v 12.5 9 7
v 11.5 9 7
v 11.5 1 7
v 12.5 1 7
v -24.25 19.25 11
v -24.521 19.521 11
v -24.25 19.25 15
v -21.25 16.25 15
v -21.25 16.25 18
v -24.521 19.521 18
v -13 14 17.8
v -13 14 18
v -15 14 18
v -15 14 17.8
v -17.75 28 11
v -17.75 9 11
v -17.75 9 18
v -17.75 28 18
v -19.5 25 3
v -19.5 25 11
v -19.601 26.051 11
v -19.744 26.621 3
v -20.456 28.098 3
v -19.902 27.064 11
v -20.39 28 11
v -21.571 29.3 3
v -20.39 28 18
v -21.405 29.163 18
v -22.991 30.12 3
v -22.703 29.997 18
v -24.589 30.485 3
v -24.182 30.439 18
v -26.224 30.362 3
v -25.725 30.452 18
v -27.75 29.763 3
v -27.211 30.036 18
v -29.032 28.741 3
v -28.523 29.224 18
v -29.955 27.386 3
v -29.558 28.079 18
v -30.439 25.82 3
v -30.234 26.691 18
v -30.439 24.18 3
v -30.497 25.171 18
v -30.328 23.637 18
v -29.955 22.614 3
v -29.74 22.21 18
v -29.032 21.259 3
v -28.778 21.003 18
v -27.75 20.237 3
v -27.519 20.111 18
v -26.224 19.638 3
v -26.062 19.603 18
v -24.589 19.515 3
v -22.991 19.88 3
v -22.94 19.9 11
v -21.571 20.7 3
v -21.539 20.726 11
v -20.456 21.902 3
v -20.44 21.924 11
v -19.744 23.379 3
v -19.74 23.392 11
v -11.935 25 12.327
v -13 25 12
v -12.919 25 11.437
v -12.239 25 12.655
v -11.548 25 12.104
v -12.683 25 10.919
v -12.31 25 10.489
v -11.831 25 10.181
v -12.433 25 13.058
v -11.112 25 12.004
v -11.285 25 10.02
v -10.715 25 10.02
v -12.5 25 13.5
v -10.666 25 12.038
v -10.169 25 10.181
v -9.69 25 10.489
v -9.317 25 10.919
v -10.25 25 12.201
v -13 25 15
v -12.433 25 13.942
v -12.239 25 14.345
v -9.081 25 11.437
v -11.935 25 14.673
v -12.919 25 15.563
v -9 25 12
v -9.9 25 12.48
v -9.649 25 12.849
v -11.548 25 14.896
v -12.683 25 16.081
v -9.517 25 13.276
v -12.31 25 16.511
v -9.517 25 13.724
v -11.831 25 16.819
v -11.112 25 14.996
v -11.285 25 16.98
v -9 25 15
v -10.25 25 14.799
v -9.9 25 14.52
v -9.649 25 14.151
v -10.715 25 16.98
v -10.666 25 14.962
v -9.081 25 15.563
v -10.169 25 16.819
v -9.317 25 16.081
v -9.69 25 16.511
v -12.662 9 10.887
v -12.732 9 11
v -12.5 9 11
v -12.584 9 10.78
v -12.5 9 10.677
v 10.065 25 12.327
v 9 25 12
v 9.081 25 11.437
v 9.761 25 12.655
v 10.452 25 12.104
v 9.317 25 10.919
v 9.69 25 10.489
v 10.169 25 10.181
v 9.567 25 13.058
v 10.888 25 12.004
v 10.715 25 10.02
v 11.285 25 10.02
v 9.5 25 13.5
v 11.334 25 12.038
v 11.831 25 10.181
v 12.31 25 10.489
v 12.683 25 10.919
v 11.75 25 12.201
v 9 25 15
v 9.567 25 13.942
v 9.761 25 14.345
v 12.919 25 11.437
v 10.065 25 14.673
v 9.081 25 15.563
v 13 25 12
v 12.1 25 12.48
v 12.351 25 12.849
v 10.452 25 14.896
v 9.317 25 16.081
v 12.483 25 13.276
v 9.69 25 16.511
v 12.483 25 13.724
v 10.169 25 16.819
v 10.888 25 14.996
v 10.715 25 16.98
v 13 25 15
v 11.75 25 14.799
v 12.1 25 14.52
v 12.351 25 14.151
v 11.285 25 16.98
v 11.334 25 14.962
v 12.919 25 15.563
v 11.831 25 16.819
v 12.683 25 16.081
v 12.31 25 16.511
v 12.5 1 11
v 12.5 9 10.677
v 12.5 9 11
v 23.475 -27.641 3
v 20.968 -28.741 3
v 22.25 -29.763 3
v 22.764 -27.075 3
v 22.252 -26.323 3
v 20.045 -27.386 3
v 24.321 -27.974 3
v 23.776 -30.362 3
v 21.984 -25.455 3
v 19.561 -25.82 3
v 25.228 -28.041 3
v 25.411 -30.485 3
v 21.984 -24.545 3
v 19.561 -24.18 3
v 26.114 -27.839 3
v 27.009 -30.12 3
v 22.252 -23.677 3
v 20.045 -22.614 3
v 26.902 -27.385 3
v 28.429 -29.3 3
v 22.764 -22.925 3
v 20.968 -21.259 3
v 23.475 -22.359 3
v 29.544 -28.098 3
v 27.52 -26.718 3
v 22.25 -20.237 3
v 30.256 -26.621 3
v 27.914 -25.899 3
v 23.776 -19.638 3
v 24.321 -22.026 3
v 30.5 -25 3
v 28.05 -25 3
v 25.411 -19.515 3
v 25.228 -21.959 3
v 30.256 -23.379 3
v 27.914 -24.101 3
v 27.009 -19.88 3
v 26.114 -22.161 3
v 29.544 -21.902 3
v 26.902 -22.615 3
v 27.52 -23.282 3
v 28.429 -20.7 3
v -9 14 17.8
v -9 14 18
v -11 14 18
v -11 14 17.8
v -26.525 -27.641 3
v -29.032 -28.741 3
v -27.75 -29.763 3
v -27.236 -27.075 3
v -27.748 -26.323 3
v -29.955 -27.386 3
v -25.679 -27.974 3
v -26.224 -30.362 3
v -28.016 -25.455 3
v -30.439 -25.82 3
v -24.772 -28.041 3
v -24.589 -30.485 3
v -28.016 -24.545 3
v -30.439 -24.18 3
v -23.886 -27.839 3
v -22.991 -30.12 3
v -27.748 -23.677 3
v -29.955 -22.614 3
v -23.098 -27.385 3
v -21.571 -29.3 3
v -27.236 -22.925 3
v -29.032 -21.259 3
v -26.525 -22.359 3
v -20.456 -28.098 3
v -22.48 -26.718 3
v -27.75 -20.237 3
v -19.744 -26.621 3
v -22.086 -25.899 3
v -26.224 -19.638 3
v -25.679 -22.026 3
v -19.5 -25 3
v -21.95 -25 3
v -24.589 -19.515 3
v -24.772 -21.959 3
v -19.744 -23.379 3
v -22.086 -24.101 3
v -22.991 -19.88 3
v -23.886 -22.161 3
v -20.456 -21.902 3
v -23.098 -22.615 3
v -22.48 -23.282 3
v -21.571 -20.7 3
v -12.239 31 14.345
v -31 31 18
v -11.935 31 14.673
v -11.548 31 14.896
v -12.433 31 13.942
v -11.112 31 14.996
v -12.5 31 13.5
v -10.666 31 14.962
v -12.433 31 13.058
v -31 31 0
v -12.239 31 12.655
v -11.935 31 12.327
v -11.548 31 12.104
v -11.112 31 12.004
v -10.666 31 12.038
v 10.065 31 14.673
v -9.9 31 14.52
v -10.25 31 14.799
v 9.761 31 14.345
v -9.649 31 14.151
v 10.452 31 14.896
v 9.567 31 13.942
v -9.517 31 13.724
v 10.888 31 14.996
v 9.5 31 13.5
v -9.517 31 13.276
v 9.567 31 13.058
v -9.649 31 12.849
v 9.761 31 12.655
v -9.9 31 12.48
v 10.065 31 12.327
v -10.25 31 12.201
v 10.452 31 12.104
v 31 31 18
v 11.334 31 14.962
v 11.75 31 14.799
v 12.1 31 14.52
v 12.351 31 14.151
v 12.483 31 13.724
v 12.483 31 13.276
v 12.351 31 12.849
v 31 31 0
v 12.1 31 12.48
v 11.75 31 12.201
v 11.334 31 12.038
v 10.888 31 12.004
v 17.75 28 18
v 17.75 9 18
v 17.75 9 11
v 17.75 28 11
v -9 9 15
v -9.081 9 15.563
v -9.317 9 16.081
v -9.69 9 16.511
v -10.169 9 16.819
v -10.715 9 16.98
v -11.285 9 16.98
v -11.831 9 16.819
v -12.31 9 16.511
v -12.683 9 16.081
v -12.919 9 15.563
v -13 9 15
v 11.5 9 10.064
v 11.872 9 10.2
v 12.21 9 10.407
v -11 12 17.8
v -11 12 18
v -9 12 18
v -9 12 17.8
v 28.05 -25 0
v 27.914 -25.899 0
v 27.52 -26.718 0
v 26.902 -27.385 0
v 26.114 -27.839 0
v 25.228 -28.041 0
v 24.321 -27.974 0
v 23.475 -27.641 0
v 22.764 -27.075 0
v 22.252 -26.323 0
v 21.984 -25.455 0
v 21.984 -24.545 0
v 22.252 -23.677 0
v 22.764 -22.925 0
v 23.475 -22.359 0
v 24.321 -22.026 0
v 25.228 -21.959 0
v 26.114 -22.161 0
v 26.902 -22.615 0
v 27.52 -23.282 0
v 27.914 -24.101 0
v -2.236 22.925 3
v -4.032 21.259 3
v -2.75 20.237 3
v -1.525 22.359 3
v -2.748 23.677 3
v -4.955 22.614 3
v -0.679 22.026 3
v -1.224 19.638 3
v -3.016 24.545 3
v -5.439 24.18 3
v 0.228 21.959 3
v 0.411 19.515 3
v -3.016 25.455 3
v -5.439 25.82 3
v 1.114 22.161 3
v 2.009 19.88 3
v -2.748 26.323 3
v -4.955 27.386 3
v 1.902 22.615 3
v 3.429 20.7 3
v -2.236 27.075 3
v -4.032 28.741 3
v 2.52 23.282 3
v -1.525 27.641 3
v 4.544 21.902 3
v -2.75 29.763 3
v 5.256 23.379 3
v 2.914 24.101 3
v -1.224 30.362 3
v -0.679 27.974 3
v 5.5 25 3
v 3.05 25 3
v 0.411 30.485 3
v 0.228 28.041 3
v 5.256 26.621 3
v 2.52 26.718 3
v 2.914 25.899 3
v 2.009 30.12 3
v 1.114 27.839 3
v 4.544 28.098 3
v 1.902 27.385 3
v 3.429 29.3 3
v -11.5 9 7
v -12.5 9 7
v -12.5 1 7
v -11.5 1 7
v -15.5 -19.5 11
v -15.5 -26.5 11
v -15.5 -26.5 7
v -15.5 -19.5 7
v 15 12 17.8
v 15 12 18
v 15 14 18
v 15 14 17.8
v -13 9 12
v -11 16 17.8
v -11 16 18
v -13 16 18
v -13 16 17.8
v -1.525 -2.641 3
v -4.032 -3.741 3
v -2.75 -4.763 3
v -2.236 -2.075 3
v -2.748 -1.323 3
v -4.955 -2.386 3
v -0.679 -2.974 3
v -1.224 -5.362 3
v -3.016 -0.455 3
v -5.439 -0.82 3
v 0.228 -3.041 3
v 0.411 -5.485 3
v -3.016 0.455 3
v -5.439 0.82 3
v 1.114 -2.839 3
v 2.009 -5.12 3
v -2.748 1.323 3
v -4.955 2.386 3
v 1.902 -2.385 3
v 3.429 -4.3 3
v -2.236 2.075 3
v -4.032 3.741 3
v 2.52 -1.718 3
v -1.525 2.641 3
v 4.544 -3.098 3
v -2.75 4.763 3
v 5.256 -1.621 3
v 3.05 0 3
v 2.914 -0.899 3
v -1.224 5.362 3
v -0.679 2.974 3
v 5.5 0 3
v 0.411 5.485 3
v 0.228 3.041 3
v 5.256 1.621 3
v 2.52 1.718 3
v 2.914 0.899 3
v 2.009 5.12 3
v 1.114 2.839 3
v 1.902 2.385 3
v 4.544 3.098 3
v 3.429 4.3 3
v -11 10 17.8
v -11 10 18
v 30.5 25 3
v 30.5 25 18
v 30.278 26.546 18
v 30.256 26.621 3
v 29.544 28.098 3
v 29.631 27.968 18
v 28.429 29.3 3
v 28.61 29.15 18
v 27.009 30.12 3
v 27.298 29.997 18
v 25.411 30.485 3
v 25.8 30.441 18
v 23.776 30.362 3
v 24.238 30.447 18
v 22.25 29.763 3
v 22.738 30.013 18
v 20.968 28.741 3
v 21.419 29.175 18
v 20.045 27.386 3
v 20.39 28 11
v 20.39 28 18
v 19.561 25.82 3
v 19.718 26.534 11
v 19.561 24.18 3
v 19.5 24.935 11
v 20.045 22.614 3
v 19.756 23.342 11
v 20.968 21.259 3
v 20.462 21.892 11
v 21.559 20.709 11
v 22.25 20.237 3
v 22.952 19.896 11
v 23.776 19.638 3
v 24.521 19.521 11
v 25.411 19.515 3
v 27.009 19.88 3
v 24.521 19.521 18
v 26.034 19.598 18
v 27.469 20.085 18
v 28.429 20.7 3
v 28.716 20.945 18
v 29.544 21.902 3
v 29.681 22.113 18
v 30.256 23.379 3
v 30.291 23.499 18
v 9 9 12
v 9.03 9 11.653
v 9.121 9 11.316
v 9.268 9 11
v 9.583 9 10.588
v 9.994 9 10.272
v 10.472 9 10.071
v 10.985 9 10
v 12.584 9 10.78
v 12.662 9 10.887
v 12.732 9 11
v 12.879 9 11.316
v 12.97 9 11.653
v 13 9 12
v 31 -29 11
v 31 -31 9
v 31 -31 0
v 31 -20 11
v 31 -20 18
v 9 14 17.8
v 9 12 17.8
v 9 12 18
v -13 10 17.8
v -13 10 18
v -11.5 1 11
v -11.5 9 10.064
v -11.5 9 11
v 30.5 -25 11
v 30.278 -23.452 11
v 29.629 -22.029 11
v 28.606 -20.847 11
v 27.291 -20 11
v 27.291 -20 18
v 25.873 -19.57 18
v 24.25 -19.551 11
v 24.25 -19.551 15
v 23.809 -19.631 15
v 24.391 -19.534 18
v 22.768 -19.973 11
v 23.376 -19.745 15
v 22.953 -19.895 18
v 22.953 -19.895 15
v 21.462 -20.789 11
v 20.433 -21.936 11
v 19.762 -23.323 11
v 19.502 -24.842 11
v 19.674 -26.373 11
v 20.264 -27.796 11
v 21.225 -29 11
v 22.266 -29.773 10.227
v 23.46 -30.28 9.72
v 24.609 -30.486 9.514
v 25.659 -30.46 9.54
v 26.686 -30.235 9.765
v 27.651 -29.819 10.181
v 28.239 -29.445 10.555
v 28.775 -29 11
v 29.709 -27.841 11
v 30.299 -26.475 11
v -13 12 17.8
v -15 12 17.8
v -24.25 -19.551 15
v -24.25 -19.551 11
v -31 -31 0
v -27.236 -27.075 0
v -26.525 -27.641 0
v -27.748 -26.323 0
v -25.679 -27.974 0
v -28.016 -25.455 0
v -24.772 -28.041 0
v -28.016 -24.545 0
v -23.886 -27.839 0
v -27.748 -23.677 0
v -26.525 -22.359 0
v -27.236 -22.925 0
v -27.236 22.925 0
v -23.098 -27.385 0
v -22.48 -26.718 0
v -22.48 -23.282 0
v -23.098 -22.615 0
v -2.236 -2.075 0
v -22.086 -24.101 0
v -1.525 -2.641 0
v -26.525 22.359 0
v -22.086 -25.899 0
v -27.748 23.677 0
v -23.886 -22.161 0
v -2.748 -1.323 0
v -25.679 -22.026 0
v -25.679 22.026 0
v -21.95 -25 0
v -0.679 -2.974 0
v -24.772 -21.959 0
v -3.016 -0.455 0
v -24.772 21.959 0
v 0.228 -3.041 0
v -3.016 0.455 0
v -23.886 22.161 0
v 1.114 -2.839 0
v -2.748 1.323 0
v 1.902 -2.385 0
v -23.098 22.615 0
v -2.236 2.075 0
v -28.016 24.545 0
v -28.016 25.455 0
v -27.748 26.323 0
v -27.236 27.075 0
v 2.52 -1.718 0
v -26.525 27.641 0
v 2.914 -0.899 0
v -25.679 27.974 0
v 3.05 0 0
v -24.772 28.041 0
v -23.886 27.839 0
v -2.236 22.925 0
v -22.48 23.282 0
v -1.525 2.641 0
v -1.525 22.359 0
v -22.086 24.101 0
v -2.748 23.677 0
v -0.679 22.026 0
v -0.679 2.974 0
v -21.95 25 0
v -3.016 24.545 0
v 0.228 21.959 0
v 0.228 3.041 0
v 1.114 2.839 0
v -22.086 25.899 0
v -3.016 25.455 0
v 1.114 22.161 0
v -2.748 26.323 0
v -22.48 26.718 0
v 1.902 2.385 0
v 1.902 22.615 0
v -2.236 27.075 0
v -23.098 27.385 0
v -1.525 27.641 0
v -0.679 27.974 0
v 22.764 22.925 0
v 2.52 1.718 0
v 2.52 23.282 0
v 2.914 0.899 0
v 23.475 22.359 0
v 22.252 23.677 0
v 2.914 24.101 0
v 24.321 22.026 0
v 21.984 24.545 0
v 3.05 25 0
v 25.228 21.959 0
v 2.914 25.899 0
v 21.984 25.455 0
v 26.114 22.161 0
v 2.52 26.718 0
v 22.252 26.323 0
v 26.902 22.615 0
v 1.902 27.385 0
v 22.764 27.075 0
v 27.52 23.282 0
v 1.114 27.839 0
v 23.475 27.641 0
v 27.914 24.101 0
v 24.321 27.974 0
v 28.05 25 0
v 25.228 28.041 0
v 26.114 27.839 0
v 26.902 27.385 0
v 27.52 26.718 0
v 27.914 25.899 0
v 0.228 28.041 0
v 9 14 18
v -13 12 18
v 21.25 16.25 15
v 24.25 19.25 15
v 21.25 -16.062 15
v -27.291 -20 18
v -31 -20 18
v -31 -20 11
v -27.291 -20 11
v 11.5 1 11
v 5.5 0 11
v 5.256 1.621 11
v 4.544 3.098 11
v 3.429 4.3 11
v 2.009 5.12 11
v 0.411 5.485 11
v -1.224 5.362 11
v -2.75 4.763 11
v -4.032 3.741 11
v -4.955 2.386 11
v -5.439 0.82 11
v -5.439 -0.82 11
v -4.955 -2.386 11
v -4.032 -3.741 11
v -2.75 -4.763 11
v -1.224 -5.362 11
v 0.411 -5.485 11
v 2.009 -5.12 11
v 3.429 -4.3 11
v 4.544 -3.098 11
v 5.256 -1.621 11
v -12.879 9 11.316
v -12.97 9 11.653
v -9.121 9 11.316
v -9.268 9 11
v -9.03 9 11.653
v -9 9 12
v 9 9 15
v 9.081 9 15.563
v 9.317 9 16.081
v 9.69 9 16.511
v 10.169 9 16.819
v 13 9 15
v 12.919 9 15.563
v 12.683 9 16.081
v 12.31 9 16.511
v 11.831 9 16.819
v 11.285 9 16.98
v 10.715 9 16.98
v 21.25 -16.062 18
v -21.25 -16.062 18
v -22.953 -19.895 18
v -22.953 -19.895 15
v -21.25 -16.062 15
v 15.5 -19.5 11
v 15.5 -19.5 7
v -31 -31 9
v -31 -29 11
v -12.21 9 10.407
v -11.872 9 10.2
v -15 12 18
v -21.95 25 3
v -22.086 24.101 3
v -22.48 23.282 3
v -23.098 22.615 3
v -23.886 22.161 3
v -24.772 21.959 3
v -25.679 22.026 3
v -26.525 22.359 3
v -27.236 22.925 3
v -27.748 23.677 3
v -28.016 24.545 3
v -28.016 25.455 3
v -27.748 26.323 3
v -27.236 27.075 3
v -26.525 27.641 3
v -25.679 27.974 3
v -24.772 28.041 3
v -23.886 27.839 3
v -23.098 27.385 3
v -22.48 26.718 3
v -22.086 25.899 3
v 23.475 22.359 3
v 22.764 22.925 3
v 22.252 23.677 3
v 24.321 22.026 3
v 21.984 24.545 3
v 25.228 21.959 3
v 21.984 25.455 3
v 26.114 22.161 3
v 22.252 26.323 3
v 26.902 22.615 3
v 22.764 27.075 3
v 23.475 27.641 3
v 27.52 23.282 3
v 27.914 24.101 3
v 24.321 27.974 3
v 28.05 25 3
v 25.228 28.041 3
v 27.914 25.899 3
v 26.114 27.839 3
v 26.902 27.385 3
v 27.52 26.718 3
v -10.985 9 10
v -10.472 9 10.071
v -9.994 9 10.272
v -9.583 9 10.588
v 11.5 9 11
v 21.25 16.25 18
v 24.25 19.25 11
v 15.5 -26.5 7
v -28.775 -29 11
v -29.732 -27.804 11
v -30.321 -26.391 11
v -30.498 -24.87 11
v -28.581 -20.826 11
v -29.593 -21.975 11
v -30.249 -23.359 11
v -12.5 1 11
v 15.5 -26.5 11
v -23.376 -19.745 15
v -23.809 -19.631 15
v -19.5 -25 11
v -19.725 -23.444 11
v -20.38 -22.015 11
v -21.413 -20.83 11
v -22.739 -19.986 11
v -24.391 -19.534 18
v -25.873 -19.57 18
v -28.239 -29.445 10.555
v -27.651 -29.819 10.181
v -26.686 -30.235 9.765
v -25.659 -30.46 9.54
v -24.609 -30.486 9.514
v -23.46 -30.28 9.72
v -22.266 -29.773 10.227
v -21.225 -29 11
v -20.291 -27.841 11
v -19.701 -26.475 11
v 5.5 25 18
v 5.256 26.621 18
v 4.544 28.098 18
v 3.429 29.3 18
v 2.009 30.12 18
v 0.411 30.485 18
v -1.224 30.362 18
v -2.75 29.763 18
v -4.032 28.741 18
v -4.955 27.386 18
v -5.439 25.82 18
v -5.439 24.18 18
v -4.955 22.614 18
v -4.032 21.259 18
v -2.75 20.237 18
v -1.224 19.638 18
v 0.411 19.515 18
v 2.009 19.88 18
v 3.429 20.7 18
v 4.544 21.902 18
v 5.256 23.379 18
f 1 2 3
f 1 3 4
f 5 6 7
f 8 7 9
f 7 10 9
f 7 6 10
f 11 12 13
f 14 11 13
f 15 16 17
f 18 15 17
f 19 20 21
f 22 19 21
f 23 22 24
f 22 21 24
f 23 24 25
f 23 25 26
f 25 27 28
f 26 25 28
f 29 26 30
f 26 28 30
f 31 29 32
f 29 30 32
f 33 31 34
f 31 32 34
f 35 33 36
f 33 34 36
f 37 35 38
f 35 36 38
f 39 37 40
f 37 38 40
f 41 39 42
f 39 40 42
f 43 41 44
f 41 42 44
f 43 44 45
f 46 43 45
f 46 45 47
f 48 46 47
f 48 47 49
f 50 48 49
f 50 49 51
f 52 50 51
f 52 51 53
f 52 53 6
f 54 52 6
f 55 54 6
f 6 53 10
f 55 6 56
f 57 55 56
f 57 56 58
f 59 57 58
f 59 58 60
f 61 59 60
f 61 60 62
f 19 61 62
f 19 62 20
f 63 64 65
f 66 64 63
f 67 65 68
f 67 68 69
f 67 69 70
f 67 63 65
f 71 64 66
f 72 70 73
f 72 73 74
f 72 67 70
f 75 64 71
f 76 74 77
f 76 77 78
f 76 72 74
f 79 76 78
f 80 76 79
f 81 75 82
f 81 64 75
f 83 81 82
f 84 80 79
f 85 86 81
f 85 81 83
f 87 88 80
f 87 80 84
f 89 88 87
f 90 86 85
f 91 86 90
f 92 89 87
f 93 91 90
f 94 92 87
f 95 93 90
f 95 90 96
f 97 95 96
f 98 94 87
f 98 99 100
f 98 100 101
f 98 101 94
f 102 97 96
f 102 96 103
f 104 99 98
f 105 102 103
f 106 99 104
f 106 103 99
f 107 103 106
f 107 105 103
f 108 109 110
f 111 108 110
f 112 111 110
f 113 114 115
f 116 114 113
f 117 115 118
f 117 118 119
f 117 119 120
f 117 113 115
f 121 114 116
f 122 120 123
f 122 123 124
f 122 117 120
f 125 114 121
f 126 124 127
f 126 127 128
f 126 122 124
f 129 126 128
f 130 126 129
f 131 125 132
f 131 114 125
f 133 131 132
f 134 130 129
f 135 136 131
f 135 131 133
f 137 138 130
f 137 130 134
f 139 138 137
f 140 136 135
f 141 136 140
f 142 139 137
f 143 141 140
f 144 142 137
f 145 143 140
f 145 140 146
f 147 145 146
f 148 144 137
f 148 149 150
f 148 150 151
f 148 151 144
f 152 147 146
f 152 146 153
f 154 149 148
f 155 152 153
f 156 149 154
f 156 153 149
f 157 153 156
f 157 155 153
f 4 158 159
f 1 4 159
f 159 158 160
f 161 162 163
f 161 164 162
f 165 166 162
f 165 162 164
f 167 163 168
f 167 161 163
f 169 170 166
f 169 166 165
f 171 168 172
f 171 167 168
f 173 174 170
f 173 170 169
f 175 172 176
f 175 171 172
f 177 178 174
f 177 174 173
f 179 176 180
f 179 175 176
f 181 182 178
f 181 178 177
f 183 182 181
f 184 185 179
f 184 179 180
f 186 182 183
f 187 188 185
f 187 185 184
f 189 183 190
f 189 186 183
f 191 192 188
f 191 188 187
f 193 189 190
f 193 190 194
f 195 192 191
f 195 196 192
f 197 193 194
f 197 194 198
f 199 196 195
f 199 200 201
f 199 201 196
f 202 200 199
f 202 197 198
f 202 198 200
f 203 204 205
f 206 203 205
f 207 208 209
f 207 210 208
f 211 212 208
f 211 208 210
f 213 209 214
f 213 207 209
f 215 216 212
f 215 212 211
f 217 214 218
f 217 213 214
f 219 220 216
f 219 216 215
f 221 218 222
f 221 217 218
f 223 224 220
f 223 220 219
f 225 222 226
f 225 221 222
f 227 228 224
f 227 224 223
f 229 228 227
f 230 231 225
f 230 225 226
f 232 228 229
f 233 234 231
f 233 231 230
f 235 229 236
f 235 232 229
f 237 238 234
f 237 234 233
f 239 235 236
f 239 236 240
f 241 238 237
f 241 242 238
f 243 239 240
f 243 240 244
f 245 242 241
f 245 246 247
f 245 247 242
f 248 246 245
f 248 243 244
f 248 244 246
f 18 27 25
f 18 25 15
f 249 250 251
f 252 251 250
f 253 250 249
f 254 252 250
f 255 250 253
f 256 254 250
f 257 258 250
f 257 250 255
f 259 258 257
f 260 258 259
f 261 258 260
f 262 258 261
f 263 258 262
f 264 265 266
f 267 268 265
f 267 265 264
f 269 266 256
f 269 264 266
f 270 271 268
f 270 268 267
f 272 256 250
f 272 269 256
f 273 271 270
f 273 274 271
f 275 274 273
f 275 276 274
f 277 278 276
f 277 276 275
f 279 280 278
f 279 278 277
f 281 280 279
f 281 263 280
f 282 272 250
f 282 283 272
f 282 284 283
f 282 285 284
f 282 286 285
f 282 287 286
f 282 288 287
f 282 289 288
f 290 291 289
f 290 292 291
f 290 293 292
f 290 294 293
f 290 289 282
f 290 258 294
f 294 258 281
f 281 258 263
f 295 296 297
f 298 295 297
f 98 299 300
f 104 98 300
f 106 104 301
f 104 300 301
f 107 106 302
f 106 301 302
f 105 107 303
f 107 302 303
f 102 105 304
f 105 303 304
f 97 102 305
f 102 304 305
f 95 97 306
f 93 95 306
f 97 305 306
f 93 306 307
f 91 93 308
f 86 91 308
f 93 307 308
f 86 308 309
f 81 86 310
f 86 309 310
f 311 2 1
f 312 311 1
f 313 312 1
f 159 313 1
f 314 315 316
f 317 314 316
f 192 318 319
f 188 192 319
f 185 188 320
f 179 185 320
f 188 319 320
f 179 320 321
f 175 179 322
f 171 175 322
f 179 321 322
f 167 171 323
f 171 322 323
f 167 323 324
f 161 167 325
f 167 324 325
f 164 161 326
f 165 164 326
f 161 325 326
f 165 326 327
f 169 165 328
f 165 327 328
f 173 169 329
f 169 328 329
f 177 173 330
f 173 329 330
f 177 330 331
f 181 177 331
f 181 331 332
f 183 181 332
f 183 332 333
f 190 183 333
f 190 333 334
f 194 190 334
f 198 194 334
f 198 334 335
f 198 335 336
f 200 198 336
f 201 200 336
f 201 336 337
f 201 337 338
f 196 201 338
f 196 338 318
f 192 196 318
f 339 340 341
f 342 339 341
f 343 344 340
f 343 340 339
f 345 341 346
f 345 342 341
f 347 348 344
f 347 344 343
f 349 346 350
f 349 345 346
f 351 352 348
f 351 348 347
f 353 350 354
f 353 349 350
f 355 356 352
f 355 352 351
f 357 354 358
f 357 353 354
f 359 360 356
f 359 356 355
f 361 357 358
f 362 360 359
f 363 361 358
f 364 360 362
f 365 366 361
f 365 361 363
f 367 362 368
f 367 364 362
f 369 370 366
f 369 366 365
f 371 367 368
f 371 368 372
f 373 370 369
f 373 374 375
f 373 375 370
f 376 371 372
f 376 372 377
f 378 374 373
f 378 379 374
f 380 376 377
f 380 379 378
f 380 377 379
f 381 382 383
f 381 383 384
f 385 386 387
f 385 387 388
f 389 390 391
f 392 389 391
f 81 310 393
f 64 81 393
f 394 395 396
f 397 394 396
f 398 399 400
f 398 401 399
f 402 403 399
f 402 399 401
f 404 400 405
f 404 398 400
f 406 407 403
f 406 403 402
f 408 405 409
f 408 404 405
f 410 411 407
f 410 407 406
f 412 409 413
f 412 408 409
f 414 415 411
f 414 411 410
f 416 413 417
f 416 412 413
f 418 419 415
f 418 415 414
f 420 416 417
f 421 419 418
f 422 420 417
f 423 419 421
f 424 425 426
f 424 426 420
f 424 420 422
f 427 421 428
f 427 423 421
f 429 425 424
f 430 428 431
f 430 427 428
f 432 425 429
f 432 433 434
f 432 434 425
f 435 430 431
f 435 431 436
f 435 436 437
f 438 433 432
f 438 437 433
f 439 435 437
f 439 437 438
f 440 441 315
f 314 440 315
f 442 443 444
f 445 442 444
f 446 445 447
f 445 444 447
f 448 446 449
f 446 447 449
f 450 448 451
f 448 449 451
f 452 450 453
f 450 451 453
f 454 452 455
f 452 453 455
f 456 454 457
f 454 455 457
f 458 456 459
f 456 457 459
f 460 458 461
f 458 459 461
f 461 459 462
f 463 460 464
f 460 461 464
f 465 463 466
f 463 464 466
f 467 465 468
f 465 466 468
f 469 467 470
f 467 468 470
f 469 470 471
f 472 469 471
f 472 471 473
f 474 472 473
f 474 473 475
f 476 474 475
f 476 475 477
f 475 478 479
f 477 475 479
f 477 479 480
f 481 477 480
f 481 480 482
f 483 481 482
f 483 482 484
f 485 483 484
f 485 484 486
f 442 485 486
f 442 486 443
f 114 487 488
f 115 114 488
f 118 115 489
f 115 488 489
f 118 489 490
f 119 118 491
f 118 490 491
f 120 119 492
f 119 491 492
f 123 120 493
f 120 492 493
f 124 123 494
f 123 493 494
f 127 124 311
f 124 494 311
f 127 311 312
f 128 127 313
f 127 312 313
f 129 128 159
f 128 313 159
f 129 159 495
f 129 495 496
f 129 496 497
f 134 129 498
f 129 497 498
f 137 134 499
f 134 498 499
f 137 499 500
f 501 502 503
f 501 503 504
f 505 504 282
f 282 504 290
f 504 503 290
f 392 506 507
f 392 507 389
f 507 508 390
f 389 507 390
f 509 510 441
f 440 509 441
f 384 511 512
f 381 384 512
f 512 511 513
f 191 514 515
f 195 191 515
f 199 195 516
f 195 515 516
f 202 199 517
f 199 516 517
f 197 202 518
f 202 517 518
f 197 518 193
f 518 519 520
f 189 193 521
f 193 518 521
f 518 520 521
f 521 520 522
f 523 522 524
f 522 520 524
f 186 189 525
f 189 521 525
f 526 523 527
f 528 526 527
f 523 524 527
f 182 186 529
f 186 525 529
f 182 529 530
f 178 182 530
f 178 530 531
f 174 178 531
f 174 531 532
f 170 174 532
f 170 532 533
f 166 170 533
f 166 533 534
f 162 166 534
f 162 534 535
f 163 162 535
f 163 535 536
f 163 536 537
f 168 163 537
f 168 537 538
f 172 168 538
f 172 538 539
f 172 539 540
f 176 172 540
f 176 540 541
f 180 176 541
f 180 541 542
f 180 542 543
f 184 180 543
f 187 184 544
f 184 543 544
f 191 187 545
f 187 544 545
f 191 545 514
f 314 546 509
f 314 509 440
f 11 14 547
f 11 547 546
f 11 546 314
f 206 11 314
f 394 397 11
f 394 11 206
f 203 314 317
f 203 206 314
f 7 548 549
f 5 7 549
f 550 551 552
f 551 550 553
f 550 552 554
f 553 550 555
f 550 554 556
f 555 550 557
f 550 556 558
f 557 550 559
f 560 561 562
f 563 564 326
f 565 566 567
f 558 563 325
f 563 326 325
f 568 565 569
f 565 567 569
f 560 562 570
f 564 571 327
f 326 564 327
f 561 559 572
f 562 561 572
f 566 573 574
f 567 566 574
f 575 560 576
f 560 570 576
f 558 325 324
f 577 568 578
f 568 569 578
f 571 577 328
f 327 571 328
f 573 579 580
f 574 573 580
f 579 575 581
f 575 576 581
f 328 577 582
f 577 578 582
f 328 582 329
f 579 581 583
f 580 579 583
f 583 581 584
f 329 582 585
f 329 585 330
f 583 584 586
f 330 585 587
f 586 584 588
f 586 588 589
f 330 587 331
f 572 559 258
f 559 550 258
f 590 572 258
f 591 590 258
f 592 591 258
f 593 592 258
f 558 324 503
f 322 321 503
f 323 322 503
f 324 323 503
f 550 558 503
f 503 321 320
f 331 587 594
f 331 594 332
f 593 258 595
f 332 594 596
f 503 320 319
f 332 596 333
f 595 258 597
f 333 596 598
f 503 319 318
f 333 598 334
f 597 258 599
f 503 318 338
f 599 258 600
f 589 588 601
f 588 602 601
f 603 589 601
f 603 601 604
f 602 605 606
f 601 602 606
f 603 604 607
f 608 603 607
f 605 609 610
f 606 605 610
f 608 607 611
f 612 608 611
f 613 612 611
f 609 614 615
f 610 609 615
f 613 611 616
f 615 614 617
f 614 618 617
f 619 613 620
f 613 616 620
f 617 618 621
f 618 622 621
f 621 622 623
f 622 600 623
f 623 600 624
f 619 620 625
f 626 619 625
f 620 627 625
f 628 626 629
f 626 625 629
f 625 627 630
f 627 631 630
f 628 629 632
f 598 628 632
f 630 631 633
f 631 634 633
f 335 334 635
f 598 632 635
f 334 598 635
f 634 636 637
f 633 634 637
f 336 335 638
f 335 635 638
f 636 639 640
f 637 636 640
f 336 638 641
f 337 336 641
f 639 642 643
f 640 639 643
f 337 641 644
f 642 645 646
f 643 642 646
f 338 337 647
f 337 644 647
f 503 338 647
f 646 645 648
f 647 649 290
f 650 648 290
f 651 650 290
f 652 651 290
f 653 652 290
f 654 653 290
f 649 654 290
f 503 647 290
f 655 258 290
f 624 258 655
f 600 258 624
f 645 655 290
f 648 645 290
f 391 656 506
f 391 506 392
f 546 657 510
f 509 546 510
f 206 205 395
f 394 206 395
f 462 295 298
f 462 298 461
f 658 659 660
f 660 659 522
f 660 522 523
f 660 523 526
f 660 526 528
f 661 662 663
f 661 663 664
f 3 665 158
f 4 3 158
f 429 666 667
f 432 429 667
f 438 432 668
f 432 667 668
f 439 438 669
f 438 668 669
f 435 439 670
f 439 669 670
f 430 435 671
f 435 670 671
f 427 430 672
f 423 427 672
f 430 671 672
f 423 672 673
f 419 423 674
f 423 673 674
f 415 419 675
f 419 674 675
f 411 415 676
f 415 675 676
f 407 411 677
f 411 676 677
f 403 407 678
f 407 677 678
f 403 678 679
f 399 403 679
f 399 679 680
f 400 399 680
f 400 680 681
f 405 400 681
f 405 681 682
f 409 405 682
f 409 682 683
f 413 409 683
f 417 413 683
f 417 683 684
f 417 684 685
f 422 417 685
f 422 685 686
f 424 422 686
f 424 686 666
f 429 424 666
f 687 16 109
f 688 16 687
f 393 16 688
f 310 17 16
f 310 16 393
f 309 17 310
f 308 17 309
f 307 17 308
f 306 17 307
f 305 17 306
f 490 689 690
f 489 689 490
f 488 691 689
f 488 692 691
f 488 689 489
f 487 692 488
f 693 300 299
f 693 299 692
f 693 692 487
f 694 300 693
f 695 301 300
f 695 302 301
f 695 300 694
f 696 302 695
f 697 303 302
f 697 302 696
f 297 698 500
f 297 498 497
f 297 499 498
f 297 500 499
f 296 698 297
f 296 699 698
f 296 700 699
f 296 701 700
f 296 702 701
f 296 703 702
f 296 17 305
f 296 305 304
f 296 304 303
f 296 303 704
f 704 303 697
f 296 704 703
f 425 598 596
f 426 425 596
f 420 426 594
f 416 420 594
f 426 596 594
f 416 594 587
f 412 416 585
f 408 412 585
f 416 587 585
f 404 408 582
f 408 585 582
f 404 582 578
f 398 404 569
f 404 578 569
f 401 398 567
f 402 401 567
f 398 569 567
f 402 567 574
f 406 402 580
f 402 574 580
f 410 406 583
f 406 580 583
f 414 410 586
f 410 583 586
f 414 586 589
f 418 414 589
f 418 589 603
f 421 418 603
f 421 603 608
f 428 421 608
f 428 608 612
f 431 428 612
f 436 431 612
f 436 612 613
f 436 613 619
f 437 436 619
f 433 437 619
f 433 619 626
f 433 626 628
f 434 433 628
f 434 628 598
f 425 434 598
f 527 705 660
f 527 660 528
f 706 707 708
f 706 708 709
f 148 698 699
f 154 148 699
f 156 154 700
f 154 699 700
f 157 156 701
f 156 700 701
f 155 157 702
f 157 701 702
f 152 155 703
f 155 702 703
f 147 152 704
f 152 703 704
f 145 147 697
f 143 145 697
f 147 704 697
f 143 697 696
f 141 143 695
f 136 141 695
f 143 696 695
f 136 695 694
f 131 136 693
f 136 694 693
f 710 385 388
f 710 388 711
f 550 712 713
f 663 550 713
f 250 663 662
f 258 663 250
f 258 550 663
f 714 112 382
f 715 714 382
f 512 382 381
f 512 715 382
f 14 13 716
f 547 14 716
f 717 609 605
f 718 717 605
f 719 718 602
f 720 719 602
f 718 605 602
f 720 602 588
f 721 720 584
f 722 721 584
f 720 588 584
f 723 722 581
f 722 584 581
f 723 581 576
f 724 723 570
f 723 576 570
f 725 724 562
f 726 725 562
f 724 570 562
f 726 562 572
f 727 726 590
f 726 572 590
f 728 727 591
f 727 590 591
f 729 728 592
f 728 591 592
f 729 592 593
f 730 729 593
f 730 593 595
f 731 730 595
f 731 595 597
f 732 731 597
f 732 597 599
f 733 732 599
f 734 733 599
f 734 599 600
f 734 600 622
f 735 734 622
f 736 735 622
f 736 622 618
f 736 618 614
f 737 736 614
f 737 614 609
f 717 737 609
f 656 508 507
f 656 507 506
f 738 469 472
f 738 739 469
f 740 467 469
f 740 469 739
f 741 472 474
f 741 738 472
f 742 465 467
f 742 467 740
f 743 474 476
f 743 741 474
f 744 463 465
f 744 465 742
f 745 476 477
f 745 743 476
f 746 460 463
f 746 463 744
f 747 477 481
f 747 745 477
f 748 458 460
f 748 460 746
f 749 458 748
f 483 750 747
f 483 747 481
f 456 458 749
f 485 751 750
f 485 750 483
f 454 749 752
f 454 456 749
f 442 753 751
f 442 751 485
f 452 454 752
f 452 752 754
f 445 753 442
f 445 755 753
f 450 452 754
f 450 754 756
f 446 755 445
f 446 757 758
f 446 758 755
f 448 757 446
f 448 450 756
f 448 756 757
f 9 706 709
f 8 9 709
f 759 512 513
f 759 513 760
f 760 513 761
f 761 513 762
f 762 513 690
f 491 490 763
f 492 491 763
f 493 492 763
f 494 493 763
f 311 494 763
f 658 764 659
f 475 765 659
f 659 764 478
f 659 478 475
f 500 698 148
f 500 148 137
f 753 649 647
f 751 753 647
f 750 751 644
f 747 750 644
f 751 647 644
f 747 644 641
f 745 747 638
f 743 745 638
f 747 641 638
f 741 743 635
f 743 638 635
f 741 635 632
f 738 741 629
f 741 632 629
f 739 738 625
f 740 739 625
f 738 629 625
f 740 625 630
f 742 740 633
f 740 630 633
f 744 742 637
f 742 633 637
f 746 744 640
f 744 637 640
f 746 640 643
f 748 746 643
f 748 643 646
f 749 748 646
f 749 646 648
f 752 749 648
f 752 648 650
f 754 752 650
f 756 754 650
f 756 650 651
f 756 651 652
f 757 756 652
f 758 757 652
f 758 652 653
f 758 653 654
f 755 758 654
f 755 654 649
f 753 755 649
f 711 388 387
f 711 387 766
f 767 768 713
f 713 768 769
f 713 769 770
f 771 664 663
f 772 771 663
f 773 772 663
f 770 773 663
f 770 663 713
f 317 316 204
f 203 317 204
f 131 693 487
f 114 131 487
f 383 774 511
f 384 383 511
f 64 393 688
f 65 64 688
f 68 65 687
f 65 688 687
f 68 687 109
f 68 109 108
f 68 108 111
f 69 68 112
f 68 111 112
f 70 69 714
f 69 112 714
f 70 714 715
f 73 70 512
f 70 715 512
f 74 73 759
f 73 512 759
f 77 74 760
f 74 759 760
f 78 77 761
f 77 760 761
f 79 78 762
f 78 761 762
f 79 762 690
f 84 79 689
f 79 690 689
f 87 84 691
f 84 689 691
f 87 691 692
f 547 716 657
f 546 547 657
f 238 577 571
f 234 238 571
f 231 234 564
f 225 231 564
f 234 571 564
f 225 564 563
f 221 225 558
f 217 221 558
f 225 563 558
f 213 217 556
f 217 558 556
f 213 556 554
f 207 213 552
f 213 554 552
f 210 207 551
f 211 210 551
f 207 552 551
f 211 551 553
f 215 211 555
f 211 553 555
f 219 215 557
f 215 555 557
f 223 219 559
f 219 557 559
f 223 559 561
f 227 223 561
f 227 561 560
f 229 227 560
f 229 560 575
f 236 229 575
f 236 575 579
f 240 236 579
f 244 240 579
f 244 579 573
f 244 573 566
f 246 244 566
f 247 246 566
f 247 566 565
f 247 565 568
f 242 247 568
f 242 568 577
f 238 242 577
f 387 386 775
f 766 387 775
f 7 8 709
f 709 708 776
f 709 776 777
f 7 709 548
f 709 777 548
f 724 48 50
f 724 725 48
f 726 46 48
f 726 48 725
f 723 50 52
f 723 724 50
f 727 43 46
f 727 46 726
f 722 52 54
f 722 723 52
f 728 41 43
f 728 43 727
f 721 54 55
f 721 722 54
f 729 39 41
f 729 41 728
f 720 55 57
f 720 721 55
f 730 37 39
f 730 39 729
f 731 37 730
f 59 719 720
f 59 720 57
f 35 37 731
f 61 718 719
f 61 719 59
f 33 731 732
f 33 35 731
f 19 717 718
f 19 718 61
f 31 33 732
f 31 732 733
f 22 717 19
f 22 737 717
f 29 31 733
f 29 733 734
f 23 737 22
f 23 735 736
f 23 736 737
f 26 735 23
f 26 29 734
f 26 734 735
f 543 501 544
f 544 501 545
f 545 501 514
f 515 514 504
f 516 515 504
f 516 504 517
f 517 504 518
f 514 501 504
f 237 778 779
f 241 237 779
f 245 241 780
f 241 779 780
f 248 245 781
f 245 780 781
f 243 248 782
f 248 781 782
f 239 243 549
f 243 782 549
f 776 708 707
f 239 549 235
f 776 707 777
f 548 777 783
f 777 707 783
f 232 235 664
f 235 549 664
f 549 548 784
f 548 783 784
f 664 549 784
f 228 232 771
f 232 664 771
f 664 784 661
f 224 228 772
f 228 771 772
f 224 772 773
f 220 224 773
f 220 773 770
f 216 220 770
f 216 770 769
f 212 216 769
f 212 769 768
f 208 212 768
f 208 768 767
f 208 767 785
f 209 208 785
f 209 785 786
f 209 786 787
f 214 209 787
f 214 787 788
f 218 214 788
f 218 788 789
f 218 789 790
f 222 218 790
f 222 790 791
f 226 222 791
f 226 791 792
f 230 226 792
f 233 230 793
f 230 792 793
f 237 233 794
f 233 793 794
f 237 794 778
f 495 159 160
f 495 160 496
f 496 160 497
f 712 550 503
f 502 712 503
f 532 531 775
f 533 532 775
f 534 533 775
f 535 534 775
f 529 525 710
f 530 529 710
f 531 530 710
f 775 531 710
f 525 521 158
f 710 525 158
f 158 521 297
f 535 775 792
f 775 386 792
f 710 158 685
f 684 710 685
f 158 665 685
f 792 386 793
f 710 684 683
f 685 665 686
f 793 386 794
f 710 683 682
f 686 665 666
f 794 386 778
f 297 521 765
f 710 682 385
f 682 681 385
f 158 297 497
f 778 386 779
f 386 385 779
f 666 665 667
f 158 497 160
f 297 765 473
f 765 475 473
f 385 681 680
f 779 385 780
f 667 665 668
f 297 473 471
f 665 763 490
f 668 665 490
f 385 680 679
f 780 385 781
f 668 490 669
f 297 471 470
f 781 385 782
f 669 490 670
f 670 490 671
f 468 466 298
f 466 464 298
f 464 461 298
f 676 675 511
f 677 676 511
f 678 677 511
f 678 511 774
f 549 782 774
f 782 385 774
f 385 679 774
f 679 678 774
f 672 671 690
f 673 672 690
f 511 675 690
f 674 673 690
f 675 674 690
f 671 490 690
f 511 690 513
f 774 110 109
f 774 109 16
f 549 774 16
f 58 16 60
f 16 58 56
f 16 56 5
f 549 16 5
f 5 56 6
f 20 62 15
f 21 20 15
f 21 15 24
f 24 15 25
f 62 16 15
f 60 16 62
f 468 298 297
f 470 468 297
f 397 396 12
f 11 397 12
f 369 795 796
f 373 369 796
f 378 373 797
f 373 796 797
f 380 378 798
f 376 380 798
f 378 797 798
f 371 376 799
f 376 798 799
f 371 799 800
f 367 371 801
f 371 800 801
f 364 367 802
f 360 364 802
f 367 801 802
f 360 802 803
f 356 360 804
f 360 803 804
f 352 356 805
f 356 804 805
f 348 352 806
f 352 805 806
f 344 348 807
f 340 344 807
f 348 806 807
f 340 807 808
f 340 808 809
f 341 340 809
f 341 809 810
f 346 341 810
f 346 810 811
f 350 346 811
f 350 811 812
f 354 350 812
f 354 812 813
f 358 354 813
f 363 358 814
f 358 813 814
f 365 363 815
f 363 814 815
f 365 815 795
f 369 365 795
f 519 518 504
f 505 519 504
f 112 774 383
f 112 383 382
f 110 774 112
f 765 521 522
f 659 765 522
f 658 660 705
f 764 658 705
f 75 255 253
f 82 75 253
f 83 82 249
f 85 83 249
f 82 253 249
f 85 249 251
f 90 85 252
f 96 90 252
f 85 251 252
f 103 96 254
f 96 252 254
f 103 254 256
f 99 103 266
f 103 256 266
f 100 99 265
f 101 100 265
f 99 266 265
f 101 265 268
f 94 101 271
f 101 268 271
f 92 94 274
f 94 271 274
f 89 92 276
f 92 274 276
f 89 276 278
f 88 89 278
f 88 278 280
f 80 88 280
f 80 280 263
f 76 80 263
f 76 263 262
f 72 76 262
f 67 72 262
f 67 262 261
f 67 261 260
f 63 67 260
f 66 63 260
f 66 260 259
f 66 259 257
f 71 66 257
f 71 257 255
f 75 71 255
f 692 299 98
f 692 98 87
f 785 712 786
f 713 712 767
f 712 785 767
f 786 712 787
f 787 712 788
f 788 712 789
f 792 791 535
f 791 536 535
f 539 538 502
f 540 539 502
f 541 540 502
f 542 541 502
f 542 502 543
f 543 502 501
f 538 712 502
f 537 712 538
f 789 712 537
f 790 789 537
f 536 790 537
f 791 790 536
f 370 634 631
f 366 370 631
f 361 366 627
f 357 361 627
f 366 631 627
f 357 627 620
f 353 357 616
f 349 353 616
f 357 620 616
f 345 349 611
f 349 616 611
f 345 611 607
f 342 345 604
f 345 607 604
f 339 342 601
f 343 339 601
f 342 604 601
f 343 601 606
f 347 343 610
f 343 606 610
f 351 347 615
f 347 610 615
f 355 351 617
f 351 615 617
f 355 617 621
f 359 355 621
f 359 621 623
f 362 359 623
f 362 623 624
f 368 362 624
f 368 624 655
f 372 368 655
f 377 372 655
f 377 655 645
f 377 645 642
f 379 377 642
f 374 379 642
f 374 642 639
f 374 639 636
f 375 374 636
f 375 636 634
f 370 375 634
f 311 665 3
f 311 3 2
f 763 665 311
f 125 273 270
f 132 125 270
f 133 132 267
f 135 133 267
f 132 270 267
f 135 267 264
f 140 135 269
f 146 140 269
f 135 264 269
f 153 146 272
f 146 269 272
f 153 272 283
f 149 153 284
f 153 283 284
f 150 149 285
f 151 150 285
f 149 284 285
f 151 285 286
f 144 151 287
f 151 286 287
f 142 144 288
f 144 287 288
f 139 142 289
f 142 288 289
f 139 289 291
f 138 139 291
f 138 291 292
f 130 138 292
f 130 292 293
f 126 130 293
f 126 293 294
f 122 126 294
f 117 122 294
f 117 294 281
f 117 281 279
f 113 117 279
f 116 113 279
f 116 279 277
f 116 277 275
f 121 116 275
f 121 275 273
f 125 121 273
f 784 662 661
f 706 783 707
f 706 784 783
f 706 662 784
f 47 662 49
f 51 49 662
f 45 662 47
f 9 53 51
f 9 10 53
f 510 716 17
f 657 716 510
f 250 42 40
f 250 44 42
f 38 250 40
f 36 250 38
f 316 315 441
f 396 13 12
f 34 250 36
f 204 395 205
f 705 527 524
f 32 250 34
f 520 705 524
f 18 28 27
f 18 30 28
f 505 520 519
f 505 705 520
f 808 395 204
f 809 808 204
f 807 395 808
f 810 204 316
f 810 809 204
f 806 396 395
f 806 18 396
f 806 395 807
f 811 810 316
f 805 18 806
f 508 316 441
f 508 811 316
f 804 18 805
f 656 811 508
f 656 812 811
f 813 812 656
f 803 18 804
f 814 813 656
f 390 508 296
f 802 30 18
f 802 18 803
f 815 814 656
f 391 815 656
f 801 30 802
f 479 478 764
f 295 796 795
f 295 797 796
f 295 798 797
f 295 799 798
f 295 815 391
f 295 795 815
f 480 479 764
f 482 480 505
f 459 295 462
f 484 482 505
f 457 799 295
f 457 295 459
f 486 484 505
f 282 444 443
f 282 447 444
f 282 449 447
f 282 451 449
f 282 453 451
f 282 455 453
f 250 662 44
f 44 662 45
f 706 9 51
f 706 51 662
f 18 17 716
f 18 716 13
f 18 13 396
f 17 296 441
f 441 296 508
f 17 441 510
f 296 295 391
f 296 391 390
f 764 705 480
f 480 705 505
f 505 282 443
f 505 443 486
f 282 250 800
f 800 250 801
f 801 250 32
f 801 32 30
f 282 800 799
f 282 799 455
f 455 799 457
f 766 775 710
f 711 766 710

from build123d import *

# Parameters (mm, degrees)
SKETCH072_W          = 62
SKETCH072_H          = 62
PAD012_DEPTH         = 18
SKETCH073_R          = 3.05
POCKET058_DEPTH      = 18.001
POCKET059_DEPTH      = 59
POCKET060_DEPTH      = 7
SKETCH077_R          = 1.5
POCKET062_DEPTH      = 22
SKETCH078_R          = 5.5
POCKET063_DEPTH      = 15
SKETCH076_W          = 31
SKETCH076_H          = 7
SKETCH076_W_2        = 1
SKETCH076_H_2        = 8
POCKET065_DEPTH      = 11
POCKET_DEPTH         = 7
POCKET068_DEPTH      = 31.001
POCKET068_DEPTH_BACK = -31.001
POCKET069_DEPTH      = 16
SKETCH_W             = 6
SKETCH_H             = 2
POCKET070_DEPTH      = 0.2


with BuildPart() as part:
    # Sketch072 → Pad012 (new body)
    with BuildSketch(Plane.XY):
        Rectangle(SKETCH072_W, SKETCH072_H)
    extrude(amount=PAD012_DEPTH)

    # Sketch073 (on Face5 of Pad012) → Pocket058 (cut, through all)
    with BuildSketch(Plane(origin=(0, 0, 0), x_dir=(1, 0, 0), z_dir=(0, 0, -1))):
        with Locations((-25, 25)):
            Circle(SKETCH073_R)
        with Locations((25, 25)):
            Circle(SKETCH073_R)
        with Locations((-25, -25)):
            Circle(SKETCH073_R)
        with Locations((25, -25)):
            Circle(SKETCH073_R)
        Circle(SKETCH073_R)
        with Locations((0, -25)):
            Circle(SKETCH073_R)
    extrude(amount=-POCKET058_DEPTH, mode=Mode.SUBTRACT)

    # Sketch074 (on Face2 of Pocket058) → Pocket059 (cut)
    with BuildSketch(Plane.XZ.offset(31)):
        Polygon((-21.25, 20), (-21.25, 15), (-24.25, 15), (-24.25, 11), (-17.75, 11), (-17.75, 18), (17.75, 18), (17.75, 11), (24.25, 11), (24.25, 15), (21.25, 15), (21.25, 20), align=None)
    extrude(amount=-POCKET059_DEPTH, mode=Mode.SUBTRACT)

    # Sketch075 (on Face5 of Pocket059) → Pocket060 (cut)
    with BuildSketch(Plane.XY.offset(18)):
        Polygon((-19, -11), (-19, 9), (19, 9), (19, -11), (23, -20), (31, -20), (31, -31), (-31, -31), (-31, -20), (-23, -20), align=None)
    extrude(amount=-POCKET060_DEPTH, mode=Mode.SUBTRACT)

    # Sketch077 → Pocket062 (cut)
    with BuildSketch(Plane(origin=(0, 31, 0), x_dir=(-1, 0, 0), z_dir=(0, 1, 0))):
        with Locations((-11, 13.5)):
            Circle(SKETCH077_R)
        with Locations((11, 13.5)):
            Circle(SKETCH077_R)
    extrude(amount=-POCKET062_DEPTH, mode=Mode.SUBTRACT)

    # Sketch078 (on Face4 of Pocket062) → Pocket063 (cut)
    with BuildSketch(Plane.XY.offset(18)):
        with Locations((-25, 25)):
            Circle(SKETCH078_R)
        with Locations((-25, -25)):
            Circle(SKETCH078_R)
        with Locations((25, 25)):
            Circle(SKETCH078_R)
        with Locations((25, -25)):
            Circle(SKETCH078_R)
        Circle(SKETCH078_R)
        with Locations((0, 25)):
            Circle(SKETCH078_R)
    extrude(amount=-POCKET063_DEPTH, mode=Mode.SUBTRACT)

    # Sketch076 (on Face4 of Pocket060) → Pocket065 (cut)
    with BuildSketch(Plane.XY.offset(18)):
        with Locations((0, -23)):
            Rectangle(SKETCH076_W, SKETCH076_H)
        with Locations((-12, 5)):
            Rectangle(SKETCH076_W_2, SKETCH076_H_2)
        with Locations((12, 5)):
            Rectangle(SKETCH076_W_2, SKETCH076_H_2)
    extrude(amount=-POCKET065_DEPTH, mode=Mode.SUBTRACT)

    # Sketch079 → Pocket (cut)
    with BuildSketch(Plane.XY.offset(18)):
        Polygon((-25, 20), (-20, 15), (-20, 25), align=None)
        Polygon((20, 25), (20, 15), (25, 20), align=None)
    extrude(amount=-POCKET_DEPTH, mode=Mode.SUBTRACT)

    # Sketch080 → Pocket068 (cut, two sides)
    with BuildSketch(Plane.YZ) as pocket068_sk:
        Polygon((-31, 11), (-31, 9), (-29, 11), align=None)
    extrude(amount=-POCKET068_DEPTH, mode=Mode.SUBTRACT)
    extrude(pocket068_sk.sketch, amount=-POCKET068_DEPTH_BACK, mode=Mode.SUBTRACT)

    # Sketch081 (on Face44 of Pocket068) → Pocket069 (cut)
    with BuildSketch(Plane.XZ.offset(-9)):
        with BuildLine():
            ThreePointArc((-9, 15), (-11, 17), (-13, 15))
            Line((-13, 15), (-13, 12))
            ThreePointArc((-13, 12), (-11, 10), (-9, 12))
            Line((-9, 15), (-9, 12))
        make_face()
        with BuildLine():
            ThreePointArc((13, 15), (11, 17), (9, 15))
            Line((9, 15), (9, 12))
            ThreePointArc((9, 12), (11, 10), (13, 12))
            Line((13, 15), (13, 12))
        make_face()
    extrude(amount=-POCKET069_DEPTH, mode=Mode.SUBTRACT)

    # Sketch (on Face22 of Pocket069) → Pocket070 (cut)
    with BuildSketch(Plane.XY.offset(18)):
        Polygon((-11, 16), (-13, 16), (-13, 14), (-15, 14), (-15, 12), (-13, 12), (-13, 10), (-11, 10), (-11, 12), (-9, 12), (-9, 14), (-11, 14), align=None)
        with Locations((12, 13)):
            Rectangle(SKETCH_W, SKETCH_H)
    extrude(amount=-POCKET070_DEPTH, mode=Mode.SUBTRACT)


solid = part.part
